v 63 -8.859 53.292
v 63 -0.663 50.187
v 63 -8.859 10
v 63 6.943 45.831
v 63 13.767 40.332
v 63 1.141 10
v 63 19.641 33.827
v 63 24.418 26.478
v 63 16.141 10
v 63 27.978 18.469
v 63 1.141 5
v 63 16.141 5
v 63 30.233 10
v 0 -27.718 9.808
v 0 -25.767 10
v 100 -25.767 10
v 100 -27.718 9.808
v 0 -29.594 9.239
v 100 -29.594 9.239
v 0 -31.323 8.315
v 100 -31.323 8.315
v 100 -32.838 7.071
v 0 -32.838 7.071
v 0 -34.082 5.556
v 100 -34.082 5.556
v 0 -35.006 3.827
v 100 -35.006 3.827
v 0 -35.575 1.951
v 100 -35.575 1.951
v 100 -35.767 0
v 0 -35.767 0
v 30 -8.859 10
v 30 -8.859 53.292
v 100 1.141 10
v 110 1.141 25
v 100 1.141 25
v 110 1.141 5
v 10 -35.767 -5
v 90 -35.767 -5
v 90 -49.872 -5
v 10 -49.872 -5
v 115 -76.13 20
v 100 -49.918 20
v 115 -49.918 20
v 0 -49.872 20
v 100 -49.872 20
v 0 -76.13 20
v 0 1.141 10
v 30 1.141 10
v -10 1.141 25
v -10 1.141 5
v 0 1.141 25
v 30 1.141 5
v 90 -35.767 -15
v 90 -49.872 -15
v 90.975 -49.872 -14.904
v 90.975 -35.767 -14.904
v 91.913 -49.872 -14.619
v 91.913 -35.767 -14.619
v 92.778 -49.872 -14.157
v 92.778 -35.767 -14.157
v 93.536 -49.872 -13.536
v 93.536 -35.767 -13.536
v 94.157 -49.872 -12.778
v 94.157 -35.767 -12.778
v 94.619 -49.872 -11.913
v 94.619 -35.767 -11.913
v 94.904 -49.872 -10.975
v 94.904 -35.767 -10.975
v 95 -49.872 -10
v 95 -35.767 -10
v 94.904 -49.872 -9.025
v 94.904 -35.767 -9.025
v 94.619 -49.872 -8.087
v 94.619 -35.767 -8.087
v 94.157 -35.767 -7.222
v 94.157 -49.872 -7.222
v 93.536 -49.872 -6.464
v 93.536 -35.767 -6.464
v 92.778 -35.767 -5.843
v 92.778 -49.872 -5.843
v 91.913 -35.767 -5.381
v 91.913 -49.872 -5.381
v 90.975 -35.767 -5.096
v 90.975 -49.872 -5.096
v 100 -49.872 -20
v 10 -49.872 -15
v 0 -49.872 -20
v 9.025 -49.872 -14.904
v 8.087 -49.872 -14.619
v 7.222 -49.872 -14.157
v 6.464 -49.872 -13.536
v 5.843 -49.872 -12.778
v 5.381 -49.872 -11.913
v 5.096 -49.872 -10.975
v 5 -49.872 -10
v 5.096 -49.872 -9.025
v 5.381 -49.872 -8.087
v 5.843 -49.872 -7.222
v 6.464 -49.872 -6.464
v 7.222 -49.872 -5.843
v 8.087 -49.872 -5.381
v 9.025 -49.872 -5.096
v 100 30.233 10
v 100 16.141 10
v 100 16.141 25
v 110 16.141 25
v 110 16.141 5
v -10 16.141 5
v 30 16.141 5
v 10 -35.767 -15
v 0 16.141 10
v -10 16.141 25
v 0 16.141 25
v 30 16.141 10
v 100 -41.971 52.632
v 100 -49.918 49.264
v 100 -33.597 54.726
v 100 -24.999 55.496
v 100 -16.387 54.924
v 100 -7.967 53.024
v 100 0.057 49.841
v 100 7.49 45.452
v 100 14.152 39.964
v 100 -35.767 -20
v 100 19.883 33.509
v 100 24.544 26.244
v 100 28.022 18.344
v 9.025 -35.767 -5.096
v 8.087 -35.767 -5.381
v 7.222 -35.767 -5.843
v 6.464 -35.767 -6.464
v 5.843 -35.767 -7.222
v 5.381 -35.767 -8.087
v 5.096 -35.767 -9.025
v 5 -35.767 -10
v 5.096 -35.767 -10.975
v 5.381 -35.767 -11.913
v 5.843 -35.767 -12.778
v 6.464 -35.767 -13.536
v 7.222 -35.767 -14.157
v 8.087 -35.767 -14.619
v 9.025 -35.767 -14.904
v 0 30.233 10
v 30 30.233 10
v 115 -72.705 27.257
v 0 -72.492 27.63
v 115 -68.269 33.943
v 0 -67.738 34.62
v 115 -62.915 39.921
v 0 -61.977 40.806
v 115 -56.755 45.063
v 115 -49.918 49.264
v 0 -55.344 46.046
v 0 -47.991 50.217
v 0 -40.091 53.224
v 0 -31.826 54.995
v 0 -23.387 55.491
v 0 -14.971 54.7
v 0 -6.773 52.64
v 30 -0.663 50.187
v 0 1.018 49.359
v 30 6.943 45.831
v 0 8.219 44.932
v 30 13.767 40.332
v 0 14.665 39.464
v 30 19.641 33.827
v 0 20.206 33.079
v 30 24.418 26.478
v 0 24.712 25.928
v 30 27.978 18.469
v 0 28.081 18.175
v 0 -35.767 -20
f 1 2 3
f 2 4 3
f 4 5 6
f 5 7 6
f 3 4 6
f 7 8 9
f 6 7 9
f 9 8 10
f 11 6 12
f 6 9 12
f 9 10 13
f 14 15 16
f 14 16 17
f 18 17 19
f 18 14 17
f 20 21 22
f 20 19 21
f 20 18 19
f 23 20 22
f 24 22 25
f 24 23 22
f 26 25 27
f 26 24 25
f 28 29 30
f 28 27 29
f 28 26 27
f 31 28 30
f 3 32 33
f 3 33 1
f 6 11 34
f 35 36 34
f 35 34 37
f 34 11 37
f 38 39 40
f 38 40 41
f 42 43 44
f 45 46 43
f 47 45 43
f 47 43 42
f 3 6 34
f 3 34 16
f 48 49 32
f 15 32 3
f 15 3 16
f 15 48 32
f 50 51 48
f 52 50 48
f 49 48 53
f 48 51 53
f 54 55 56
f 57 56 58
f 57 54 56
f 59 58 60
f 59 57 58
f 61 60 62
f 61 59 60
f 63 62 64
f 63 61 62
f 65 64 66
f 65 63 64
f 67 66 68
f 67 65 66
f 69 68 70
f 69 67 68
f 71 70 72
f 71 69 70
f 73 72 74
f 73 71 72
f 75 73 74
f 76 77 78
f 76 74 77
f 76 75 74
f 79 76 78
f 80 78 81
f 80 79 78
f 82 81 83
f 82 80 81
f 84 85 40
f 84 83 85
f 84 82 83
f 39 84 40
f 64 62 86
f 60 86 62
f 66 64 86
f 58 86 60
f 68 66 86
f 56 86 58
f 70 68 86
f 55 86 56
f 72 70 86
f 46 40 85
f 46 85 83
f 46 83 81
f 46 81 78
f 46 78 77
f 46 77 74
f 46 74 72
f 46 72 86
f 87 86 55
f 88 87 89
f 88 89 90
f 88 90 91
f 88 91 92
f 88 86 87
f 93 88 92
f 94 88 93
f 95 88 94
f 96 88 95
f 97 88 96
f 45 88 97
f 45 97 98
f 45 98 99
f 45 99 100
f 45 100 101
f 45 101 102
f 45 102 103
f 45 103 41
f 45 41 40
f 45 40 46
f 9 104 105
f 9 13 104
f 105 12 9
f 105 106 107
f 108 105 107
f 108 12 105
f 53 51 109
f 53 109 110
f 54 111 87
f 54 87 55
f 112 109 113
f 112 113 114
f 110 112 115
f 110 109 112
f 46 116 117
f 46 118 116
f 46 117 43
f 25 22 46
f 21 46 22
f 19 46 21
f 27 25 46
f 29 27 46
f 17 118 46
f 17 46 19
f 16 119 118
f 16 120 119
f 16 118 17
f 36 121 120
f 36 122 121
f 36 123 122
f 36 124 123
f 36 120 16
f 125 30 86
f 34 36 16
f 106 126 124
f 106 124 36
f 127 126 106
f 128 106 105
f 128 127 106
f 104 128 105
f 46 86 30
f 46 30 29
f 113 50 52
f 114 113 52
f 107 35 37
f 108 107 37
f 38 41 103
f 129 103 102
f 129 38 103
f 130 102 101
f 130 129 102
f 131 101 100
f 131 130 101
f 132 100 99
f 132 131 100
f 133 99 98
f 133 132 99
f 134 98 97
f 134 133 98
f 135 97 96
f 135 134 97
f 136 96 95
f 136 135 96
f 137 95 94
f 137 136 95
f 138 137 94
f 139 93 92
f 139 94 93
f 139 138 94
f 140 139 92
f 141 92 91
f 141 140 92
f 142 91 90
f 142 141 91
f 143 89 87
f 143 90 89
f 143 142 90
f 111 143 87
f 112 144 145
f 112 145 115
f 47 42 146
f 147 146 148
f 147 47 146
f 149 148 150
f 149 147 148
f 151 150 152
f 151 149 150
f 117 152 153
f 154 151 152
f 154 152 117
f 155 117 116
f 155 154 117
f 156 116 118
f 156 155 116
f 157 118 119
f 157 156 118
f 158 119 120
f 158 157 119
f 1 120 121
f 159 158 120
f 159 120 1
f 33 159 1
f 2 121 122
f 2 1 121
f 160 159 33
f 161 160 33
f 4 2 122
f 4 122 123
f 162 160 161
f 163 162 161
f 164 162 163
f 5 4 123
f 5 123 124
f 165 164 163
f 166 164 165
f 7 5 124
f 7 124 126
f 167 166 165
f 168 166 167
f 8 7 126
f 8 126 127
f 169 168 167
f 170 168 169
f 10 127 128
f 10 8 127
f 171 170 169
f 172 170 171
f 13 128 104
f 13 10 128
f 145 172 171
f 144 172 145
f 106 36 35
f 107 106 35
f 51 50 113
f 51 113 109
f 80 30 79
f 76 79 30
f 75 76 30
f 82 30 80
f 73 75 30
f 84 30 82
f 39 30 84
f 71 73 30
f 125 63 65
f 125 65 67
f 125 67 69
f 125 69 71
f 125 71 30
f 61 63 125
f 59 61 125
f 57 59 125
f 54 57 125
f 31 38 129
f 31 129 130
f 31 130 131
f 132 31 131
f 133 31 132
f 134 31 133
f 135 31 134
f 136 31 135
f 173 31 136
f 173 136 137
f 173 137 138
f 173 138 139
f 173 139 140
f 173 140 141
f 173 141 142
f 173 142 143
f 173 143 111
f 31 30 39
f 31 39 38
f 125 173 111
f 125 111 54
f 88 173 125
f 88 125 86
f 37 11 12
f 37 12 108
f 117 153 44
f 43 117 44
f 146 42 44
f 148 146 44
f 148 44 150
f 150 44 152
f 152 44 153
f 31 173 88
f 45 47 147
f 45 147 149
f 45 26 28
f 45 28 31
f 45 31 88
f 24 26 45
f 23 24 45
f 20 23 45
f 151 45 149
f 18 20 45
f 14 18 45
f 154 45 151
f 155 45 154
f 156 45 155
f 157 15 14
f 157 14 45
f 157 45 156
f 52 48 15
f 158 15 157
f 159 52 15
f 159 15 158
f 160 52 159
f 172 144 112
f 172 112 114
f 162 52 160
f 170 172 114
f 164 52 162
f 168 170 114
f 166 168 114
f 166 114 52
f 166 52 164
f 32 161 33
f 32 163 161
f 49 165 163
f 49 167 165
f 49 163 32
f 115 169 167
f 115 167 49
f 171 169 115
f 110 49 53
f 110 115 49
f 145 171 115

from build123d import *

# Parameters (mm, degrees)
BOSS_EXTRUDE1_DEPTH = 115
SKETCH4_W           = 110.804791126
SKETCH4_H           = 80.151186243
CUT_EXTRUDE1_DEPTH  = 15
SKETCH6_W           = 33
SKETCH6_H           = 45.5
CUT_EXTRUDE2_DEPTH  = 40
CUT_EXTRUDE3_DEPTH  = 144.740217058
SKETCH10_W          = 47
SKETCH10_H          = 20
SKETCH10_W_2        = 40
BOSS_EXTRUDE2_DEPTH = 15


with BuildPart() as part:
    # Sketch3 → Boss-Extrude1 (new body)
    with BuildSketch(Plane(origin=(0, 0, 0), x_dir=(0, 0, -1), z_dir=(1, 0, 0))):
        with BuildLine():
            Line((20, -35.767294724), (20, -49.872197862))
            Line((20, -49.872197862), (-20, -49.872197862))
            Line((-20, -49.872197862), (-20, -76.130091706))
            ThreePointArc((-20, -76.130091706), (-55.256322222, -19.163880915), (-10, 30.232705276))
            Line((-10, 30.232705276), (-10, -25.767294724))
            ThreePointArc((-10, -25.767294724), (-7.071067812, -32.838362535), (0, -35.767294724))
            Line((0, -35.767294724), (20, -35.767294724))
        make_face()
    extrude(amount=BOSS_EXTRUDE1_DEPTH)

    # Sketch4 → Cut-Extrude1 (cut)
    with BuildSketch(Plane(origin=(115, 0, 0), x_dir=(0, 0, -1), z_dir=(1, 0, 0))):
        with Locations((-10, -9.842887845)):
            Rectangle(SKETCH4_W, SKETCH4_H)
    extrude(amount=-CUT_EXTRUDE1_DEPTH, mode=Mode.SUBTRACT)

    # Sketch6 → Cut-Extrude2 (cut)
    with BuildSketch(Plane(origin=(0, 31.141039246, 0), x_dir=(1, 0, 0), z_dir=(0, 1, 0))):
        with Locations((46.5, -32.75)):
            Rectangle(SKETCH6_W, SKETCH6_H)
    extrude(amount=-CUT_EXTRUDE2_DEPTH, mode=Mode.SUBTRACT)

    # Sketch9 → Cut-Extrude3 (cut, through all)
    with BuildSketch(Plane(origin=(0, -35.767294724, 0), x_dir=(1, 0, 0), z_dir=(0, 1, 0))):
        with BuildLine():
            Line((90, 5), (10, 5))
            ThreePointArc((10, 5), (5, 10), (10, 15))
            Line((10, 15), (90, 15))
            ThreePointArc((90, 15), (95, 10), (90, 5))
        make_face()
    extrude(amount=-CUT_EXTRUDE3_DEPTH, mode=Mode.SUBTRACT)

    # Sketch10 → Boss-Extrude2 (add)
    with BuildSketch(Plane(origin=(0, 1.141039246, 0), x_dir=(1, 0, 0), z_dir=(0, 1, 0))):
        with Locations((86.5, -15)):
            Rectangle(SKETCH10_W, SKETCH10_H)
        with Locations((10, -15)):
            Rectangle(SKETCH10_W_2, SKETCH10_H)
    extrude(amount=BOSS_EXTRUDE2_DEPTH)


solid = part.part
